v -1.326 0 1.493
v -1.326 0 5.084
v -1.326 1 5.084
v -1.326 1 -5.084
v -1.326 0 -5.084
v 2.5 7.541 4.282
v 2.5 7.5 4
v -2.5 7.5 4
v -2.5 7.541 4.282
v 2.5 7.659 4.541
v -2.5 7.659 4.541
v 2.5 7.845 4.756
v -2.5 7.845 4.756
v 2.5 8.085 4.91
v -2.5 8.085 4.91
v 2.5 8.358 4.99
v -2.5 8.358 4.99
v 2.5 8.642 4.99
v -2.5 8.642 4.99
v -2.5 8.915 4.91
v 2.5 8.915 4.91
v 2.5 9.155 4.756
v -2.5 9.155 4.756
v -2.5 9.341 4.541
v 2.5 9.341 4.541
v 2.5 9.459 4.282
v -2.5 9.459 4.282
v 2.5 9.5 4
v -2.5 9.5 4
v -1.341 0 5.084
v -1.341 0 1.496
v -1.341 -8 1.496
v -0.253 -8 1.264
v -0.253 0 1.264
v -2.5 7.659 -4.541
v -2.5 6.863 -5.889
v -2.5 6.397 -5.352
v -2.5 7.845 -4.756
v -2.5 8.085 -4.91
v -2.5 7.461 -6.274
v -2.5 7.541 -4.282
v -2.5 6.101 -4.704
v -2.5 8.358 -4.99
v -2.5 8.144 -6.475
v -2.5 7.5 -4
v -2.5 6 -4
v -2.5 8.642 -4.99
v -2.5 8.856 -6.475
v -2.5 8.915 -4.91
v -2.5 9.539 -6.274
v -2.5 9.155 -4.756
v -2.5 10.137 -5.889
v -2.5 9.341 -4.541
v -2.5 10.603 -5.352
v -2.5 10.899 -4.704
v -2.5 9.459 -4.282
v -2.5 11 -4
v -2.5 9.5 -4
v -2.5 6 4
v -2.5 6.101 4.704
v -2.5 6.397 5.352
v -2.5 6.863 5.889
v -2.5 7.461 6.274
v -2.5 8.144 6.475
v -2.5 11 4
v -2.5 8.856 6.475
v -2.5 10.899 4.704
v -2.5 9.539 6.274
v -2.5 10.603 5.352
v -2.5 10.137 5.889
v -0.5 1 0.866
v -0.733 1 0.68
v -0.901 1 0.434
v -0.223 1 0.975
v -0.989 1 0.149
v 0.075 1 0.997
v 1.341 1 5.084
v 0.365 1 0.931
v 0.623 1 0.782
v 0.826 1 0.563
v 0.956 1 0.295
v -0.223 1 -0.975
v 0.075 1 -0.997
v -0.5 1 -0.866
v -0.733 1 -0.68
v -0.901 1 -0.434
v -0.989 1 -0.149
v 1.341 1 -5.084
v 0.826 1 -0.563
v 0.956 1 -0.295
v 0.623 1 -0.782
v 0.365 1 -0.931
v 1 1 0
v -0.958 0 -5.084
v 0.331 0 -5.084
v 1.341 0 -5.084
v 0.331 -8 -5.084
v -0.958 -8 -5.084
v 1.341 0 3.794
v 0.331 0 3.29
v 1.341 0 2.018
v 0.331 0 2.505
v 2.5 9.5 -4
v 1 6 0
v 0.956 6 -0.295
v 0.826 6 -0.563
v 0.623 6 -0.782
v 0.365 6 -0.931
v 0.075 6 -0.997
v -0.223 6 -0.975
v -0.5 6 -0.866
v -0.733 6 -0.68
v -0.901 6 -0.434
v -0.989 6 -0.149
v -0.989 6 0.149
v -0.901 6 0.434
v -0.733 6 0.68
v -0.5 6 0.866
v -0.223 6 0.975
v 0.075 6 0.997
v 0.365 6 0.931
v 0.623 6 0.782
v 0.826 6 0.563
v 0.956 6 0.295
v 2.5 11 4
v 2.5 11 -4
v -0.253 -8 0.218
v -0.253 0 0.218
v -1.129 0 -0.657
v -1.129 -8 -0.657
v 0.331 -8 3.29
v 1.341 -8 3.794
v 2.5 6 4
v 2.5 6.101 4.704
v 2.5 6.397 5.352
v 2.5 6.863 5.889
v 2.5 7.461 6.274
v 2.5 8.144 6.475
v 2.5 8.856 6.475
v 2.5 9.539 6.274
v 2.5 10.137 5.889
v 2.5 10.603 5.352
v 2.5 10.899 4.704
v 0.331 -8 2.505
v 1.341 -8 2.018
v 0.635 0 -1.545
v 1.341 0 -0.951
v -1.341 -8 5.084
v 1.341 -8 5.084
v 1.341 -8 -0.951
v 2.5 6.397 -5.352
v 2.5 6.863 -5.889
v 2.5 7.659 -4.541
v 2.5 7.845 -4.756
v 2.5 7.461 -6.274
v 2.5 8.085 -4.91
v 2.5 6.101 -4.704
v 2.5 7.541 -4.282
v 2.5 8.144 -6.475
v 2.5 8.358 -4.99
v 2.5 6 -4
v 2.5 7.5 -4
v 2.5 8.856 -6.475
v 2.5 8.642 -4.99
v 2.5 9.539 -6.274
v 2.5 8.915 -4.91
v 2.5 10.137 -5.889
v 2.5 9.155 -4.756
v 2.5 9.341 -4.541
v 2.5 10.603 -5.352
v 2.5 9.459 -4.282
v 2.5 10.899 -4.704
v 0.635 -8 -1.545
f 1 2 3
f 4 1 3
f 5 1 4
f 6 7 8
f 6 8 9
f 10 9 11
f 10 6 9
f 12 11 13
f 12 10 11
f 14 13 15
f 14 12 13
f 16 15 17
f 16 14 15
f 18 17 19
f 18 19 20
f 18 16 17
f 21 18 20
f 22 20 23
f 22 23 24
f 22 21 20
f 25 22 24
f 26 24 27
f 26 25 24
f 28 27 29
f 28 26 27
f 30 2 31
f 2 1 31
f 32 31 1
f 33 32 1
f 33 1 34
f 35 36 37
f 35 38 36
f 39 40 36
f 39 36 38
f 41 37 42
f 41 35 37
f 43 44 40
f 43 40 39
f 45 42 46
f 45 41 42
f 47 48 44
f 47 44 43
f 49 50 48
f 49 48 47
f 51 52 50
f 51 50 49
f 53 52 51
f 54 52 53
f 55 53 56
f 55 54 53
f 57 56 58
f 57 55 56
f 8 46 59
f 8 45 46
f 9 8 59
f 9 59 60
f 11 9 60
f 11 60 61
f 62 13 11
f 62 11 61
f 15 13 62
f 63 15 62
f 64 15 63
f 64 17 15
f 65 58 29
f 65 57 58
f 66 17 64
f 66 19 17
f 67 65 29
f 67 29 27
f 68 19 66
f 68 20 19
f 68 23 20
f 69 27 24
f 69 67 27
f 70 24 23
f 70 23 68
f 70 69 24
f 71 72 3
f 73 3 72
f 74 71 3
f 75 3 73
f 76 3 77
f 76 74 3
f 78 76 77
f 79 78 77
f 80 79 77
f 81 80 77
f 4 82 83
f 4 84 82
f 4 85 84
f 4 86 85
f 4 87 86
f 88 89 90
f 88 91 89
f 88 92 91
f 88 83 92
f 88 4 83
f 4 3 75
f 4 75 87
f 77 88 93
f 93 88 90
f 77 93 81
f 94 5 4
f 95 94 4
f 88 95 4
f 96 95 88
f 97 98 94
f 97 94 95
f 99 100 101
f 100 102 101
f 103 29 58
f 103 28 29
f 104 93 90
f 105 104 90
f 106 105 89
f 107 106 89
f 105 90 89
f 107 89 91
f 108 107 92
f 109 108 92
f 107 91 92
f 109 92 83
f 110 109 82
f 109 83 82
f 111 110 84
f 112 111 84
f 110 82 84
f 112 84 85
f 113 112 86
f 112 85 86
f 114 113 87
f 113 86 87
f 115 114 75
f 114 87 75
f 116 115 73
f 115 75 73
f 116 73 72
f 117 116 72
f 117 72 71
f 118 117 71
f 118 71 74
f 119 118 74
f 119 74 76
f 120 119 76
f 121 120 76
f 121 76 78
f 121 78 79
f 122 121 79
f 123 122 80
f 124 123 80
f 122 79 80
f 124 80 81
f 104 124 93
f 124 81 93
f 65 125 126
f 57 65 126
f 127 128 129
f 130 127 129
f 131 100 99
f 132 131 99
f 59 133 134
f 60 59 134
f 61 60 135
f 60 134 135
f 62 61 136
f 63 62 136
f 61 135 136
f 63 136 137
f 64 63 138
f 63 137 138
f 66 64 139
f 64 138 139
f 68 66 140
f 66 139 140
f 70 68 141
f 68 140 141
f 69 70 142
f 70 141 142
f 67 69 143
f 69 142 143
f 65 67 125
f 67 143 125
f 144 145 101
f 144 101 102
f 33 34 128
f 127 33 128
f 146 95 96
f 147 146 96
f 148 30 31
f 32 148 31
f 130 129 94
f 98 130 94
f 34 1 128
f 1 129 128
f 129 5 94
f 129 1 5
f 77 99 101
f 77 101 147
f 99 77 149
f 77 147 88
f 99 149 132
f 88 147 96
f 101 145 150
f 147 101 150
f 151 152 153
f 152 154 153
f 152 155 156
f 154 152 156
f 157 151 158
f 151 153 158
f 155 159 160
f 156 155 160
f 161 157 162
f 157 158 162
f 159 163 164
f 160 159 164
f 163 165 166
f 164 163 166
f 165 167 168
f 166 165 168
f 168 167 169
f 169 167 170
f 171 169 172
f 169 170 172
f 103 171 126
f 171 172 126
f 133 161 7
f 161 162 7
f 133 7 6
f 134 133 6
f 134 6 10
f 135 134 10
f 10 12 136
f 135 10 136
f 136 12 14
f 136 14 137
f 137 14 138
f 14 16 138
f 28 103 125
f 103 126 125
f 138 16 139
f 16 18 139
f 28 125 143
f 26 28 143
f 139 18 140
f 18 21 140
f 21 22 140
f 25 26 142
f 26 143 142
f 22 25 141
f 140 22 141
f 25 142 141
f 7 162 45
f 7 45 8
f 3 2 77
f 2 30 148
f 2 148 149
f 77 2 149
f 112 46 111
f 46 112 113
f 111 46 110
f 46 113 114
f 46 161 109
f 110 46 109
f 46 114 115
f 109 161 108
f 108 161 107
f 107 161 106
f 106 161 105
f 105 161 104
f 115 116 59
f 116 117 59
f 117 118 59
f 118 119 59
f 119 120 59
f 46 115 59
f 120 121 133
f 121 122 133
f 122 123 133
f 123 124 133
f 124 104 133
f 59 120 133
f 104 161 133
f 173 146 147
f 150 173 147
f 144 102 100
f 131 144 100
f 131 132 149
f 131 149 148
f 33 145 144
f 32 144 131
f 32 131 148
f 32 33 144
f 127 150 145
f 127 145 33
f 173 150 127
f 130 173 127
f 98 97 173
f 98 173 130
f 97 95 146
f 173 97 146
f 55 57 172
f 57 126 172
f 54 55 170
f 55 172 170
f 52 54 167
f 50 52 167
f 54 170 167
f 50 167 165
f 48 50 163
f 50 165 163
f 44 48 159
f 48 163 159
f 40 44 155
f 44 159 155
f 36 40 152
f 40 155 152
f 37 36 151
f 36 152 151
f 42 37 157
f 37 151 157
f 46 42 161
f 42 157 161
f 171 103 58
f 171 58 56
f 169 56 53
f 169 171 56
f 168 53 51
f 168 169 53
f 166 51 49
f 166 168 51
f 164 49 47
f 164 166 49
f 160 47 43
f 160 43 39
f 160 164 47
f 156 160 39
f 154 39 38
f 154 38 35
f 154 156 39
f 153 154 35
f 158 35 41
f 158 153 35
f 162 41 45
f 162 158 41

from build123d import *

# Parameters (mm, degrees)
BOSS_EXTRUDE1_DEPTH = 8
SKETCH8_W           = 2.666068872
SKETCH8_H           = 10.16707981
BOSS_EXTRUDE2_DEPTH = 1
SKETCH9_R           = 1
BOSS_EXTRUDE3_DEPTH = 5
BOSS_EXTRUDE4_DEPTH = 2.5


with BuildPart() as part:
    # Sketch7 → Boss-Extrude1 (new body)
    with BuildSketch(Plane(origin=(0, 0, 0), x_dir=(1, 0, 0), z_dir=(0, 1, 0))):
        Polygon((-1.340563115, -5.083539905), (-1.340563115, -1.49622437), (-0.25317284, -1.264277343), (-0.25317284, -0.218468371), (-1.12873384, 0.657092629), (-0.958485867, 5.083539905), (0.330534493, 5.083539905), (0.634548729, 1.544814198), (1.340563115, 0.95051095), (1.340563115, -2.018232649), (0.330534493, -2.504655426), (0.330534493, -3.289882138), (1.340563115, -3.793675787), (1.340563115, -5.083539905), align=None)
    extrude(amount=-BOSS_EXTRUDE1_DEPTH)

    # Sketch8 → Boss-Extrude2 (add)
    with BuildSketch(Plane(origin=(0, 0, 0), x_dir=(1, 0, 0), z_dir=(0, 1, 0))):
        with Locations((0.007528679, 0)):
            Rectangle(SKETCH8_W, SKETCH8_H)
    extrude(amount=BOSS_EXTRUDE2_DEPTH)

    # Sketch9 → Boss-Extrude3 (add)
    with BuildSketch(Plane(origin=(0, 1, 0), x_dir=(1, 0, 0), z_dir=(0, 1, 0))):
        Circle(SKETCH9_R)
    extrude(amount=BOSS_EXTRUDE3_DEPTH)

    # Sketch11 → Boss-Extrude4 (add, symmetric)
    with BuildSketch(Plane(origin=(0, 0, 0), x_dir=(0, 0, -1), z_dir=(1, 0, 0))):
        with BuildLine():
            Line((-4, 11), (4, 11))
            ThreePointArc((4, 11), (6.5, 8.5), (4, 6))
            Line((4, 6), (-4, 6))
            ThreePointArc((-4, 6), (-6.5, 8.5), (-4, 11))
        make_face()
        with BuildLine():
            Line((-4, 9.5), (4, 9.5))
            ThreePointArc((4, 9.5), (5, 8.5), (4, 7.5))
            Line((4, 7.5), (-4, 7.5))
            ThreePointArc((-4, 7.5), (-5, 8.5), (-4, 9.5))
        make_face(mode=Mode.SUBTRACT)
    extrude(amount=BOSS_EXTRUDE4_DEPTH, both=True)


solid = part.part
